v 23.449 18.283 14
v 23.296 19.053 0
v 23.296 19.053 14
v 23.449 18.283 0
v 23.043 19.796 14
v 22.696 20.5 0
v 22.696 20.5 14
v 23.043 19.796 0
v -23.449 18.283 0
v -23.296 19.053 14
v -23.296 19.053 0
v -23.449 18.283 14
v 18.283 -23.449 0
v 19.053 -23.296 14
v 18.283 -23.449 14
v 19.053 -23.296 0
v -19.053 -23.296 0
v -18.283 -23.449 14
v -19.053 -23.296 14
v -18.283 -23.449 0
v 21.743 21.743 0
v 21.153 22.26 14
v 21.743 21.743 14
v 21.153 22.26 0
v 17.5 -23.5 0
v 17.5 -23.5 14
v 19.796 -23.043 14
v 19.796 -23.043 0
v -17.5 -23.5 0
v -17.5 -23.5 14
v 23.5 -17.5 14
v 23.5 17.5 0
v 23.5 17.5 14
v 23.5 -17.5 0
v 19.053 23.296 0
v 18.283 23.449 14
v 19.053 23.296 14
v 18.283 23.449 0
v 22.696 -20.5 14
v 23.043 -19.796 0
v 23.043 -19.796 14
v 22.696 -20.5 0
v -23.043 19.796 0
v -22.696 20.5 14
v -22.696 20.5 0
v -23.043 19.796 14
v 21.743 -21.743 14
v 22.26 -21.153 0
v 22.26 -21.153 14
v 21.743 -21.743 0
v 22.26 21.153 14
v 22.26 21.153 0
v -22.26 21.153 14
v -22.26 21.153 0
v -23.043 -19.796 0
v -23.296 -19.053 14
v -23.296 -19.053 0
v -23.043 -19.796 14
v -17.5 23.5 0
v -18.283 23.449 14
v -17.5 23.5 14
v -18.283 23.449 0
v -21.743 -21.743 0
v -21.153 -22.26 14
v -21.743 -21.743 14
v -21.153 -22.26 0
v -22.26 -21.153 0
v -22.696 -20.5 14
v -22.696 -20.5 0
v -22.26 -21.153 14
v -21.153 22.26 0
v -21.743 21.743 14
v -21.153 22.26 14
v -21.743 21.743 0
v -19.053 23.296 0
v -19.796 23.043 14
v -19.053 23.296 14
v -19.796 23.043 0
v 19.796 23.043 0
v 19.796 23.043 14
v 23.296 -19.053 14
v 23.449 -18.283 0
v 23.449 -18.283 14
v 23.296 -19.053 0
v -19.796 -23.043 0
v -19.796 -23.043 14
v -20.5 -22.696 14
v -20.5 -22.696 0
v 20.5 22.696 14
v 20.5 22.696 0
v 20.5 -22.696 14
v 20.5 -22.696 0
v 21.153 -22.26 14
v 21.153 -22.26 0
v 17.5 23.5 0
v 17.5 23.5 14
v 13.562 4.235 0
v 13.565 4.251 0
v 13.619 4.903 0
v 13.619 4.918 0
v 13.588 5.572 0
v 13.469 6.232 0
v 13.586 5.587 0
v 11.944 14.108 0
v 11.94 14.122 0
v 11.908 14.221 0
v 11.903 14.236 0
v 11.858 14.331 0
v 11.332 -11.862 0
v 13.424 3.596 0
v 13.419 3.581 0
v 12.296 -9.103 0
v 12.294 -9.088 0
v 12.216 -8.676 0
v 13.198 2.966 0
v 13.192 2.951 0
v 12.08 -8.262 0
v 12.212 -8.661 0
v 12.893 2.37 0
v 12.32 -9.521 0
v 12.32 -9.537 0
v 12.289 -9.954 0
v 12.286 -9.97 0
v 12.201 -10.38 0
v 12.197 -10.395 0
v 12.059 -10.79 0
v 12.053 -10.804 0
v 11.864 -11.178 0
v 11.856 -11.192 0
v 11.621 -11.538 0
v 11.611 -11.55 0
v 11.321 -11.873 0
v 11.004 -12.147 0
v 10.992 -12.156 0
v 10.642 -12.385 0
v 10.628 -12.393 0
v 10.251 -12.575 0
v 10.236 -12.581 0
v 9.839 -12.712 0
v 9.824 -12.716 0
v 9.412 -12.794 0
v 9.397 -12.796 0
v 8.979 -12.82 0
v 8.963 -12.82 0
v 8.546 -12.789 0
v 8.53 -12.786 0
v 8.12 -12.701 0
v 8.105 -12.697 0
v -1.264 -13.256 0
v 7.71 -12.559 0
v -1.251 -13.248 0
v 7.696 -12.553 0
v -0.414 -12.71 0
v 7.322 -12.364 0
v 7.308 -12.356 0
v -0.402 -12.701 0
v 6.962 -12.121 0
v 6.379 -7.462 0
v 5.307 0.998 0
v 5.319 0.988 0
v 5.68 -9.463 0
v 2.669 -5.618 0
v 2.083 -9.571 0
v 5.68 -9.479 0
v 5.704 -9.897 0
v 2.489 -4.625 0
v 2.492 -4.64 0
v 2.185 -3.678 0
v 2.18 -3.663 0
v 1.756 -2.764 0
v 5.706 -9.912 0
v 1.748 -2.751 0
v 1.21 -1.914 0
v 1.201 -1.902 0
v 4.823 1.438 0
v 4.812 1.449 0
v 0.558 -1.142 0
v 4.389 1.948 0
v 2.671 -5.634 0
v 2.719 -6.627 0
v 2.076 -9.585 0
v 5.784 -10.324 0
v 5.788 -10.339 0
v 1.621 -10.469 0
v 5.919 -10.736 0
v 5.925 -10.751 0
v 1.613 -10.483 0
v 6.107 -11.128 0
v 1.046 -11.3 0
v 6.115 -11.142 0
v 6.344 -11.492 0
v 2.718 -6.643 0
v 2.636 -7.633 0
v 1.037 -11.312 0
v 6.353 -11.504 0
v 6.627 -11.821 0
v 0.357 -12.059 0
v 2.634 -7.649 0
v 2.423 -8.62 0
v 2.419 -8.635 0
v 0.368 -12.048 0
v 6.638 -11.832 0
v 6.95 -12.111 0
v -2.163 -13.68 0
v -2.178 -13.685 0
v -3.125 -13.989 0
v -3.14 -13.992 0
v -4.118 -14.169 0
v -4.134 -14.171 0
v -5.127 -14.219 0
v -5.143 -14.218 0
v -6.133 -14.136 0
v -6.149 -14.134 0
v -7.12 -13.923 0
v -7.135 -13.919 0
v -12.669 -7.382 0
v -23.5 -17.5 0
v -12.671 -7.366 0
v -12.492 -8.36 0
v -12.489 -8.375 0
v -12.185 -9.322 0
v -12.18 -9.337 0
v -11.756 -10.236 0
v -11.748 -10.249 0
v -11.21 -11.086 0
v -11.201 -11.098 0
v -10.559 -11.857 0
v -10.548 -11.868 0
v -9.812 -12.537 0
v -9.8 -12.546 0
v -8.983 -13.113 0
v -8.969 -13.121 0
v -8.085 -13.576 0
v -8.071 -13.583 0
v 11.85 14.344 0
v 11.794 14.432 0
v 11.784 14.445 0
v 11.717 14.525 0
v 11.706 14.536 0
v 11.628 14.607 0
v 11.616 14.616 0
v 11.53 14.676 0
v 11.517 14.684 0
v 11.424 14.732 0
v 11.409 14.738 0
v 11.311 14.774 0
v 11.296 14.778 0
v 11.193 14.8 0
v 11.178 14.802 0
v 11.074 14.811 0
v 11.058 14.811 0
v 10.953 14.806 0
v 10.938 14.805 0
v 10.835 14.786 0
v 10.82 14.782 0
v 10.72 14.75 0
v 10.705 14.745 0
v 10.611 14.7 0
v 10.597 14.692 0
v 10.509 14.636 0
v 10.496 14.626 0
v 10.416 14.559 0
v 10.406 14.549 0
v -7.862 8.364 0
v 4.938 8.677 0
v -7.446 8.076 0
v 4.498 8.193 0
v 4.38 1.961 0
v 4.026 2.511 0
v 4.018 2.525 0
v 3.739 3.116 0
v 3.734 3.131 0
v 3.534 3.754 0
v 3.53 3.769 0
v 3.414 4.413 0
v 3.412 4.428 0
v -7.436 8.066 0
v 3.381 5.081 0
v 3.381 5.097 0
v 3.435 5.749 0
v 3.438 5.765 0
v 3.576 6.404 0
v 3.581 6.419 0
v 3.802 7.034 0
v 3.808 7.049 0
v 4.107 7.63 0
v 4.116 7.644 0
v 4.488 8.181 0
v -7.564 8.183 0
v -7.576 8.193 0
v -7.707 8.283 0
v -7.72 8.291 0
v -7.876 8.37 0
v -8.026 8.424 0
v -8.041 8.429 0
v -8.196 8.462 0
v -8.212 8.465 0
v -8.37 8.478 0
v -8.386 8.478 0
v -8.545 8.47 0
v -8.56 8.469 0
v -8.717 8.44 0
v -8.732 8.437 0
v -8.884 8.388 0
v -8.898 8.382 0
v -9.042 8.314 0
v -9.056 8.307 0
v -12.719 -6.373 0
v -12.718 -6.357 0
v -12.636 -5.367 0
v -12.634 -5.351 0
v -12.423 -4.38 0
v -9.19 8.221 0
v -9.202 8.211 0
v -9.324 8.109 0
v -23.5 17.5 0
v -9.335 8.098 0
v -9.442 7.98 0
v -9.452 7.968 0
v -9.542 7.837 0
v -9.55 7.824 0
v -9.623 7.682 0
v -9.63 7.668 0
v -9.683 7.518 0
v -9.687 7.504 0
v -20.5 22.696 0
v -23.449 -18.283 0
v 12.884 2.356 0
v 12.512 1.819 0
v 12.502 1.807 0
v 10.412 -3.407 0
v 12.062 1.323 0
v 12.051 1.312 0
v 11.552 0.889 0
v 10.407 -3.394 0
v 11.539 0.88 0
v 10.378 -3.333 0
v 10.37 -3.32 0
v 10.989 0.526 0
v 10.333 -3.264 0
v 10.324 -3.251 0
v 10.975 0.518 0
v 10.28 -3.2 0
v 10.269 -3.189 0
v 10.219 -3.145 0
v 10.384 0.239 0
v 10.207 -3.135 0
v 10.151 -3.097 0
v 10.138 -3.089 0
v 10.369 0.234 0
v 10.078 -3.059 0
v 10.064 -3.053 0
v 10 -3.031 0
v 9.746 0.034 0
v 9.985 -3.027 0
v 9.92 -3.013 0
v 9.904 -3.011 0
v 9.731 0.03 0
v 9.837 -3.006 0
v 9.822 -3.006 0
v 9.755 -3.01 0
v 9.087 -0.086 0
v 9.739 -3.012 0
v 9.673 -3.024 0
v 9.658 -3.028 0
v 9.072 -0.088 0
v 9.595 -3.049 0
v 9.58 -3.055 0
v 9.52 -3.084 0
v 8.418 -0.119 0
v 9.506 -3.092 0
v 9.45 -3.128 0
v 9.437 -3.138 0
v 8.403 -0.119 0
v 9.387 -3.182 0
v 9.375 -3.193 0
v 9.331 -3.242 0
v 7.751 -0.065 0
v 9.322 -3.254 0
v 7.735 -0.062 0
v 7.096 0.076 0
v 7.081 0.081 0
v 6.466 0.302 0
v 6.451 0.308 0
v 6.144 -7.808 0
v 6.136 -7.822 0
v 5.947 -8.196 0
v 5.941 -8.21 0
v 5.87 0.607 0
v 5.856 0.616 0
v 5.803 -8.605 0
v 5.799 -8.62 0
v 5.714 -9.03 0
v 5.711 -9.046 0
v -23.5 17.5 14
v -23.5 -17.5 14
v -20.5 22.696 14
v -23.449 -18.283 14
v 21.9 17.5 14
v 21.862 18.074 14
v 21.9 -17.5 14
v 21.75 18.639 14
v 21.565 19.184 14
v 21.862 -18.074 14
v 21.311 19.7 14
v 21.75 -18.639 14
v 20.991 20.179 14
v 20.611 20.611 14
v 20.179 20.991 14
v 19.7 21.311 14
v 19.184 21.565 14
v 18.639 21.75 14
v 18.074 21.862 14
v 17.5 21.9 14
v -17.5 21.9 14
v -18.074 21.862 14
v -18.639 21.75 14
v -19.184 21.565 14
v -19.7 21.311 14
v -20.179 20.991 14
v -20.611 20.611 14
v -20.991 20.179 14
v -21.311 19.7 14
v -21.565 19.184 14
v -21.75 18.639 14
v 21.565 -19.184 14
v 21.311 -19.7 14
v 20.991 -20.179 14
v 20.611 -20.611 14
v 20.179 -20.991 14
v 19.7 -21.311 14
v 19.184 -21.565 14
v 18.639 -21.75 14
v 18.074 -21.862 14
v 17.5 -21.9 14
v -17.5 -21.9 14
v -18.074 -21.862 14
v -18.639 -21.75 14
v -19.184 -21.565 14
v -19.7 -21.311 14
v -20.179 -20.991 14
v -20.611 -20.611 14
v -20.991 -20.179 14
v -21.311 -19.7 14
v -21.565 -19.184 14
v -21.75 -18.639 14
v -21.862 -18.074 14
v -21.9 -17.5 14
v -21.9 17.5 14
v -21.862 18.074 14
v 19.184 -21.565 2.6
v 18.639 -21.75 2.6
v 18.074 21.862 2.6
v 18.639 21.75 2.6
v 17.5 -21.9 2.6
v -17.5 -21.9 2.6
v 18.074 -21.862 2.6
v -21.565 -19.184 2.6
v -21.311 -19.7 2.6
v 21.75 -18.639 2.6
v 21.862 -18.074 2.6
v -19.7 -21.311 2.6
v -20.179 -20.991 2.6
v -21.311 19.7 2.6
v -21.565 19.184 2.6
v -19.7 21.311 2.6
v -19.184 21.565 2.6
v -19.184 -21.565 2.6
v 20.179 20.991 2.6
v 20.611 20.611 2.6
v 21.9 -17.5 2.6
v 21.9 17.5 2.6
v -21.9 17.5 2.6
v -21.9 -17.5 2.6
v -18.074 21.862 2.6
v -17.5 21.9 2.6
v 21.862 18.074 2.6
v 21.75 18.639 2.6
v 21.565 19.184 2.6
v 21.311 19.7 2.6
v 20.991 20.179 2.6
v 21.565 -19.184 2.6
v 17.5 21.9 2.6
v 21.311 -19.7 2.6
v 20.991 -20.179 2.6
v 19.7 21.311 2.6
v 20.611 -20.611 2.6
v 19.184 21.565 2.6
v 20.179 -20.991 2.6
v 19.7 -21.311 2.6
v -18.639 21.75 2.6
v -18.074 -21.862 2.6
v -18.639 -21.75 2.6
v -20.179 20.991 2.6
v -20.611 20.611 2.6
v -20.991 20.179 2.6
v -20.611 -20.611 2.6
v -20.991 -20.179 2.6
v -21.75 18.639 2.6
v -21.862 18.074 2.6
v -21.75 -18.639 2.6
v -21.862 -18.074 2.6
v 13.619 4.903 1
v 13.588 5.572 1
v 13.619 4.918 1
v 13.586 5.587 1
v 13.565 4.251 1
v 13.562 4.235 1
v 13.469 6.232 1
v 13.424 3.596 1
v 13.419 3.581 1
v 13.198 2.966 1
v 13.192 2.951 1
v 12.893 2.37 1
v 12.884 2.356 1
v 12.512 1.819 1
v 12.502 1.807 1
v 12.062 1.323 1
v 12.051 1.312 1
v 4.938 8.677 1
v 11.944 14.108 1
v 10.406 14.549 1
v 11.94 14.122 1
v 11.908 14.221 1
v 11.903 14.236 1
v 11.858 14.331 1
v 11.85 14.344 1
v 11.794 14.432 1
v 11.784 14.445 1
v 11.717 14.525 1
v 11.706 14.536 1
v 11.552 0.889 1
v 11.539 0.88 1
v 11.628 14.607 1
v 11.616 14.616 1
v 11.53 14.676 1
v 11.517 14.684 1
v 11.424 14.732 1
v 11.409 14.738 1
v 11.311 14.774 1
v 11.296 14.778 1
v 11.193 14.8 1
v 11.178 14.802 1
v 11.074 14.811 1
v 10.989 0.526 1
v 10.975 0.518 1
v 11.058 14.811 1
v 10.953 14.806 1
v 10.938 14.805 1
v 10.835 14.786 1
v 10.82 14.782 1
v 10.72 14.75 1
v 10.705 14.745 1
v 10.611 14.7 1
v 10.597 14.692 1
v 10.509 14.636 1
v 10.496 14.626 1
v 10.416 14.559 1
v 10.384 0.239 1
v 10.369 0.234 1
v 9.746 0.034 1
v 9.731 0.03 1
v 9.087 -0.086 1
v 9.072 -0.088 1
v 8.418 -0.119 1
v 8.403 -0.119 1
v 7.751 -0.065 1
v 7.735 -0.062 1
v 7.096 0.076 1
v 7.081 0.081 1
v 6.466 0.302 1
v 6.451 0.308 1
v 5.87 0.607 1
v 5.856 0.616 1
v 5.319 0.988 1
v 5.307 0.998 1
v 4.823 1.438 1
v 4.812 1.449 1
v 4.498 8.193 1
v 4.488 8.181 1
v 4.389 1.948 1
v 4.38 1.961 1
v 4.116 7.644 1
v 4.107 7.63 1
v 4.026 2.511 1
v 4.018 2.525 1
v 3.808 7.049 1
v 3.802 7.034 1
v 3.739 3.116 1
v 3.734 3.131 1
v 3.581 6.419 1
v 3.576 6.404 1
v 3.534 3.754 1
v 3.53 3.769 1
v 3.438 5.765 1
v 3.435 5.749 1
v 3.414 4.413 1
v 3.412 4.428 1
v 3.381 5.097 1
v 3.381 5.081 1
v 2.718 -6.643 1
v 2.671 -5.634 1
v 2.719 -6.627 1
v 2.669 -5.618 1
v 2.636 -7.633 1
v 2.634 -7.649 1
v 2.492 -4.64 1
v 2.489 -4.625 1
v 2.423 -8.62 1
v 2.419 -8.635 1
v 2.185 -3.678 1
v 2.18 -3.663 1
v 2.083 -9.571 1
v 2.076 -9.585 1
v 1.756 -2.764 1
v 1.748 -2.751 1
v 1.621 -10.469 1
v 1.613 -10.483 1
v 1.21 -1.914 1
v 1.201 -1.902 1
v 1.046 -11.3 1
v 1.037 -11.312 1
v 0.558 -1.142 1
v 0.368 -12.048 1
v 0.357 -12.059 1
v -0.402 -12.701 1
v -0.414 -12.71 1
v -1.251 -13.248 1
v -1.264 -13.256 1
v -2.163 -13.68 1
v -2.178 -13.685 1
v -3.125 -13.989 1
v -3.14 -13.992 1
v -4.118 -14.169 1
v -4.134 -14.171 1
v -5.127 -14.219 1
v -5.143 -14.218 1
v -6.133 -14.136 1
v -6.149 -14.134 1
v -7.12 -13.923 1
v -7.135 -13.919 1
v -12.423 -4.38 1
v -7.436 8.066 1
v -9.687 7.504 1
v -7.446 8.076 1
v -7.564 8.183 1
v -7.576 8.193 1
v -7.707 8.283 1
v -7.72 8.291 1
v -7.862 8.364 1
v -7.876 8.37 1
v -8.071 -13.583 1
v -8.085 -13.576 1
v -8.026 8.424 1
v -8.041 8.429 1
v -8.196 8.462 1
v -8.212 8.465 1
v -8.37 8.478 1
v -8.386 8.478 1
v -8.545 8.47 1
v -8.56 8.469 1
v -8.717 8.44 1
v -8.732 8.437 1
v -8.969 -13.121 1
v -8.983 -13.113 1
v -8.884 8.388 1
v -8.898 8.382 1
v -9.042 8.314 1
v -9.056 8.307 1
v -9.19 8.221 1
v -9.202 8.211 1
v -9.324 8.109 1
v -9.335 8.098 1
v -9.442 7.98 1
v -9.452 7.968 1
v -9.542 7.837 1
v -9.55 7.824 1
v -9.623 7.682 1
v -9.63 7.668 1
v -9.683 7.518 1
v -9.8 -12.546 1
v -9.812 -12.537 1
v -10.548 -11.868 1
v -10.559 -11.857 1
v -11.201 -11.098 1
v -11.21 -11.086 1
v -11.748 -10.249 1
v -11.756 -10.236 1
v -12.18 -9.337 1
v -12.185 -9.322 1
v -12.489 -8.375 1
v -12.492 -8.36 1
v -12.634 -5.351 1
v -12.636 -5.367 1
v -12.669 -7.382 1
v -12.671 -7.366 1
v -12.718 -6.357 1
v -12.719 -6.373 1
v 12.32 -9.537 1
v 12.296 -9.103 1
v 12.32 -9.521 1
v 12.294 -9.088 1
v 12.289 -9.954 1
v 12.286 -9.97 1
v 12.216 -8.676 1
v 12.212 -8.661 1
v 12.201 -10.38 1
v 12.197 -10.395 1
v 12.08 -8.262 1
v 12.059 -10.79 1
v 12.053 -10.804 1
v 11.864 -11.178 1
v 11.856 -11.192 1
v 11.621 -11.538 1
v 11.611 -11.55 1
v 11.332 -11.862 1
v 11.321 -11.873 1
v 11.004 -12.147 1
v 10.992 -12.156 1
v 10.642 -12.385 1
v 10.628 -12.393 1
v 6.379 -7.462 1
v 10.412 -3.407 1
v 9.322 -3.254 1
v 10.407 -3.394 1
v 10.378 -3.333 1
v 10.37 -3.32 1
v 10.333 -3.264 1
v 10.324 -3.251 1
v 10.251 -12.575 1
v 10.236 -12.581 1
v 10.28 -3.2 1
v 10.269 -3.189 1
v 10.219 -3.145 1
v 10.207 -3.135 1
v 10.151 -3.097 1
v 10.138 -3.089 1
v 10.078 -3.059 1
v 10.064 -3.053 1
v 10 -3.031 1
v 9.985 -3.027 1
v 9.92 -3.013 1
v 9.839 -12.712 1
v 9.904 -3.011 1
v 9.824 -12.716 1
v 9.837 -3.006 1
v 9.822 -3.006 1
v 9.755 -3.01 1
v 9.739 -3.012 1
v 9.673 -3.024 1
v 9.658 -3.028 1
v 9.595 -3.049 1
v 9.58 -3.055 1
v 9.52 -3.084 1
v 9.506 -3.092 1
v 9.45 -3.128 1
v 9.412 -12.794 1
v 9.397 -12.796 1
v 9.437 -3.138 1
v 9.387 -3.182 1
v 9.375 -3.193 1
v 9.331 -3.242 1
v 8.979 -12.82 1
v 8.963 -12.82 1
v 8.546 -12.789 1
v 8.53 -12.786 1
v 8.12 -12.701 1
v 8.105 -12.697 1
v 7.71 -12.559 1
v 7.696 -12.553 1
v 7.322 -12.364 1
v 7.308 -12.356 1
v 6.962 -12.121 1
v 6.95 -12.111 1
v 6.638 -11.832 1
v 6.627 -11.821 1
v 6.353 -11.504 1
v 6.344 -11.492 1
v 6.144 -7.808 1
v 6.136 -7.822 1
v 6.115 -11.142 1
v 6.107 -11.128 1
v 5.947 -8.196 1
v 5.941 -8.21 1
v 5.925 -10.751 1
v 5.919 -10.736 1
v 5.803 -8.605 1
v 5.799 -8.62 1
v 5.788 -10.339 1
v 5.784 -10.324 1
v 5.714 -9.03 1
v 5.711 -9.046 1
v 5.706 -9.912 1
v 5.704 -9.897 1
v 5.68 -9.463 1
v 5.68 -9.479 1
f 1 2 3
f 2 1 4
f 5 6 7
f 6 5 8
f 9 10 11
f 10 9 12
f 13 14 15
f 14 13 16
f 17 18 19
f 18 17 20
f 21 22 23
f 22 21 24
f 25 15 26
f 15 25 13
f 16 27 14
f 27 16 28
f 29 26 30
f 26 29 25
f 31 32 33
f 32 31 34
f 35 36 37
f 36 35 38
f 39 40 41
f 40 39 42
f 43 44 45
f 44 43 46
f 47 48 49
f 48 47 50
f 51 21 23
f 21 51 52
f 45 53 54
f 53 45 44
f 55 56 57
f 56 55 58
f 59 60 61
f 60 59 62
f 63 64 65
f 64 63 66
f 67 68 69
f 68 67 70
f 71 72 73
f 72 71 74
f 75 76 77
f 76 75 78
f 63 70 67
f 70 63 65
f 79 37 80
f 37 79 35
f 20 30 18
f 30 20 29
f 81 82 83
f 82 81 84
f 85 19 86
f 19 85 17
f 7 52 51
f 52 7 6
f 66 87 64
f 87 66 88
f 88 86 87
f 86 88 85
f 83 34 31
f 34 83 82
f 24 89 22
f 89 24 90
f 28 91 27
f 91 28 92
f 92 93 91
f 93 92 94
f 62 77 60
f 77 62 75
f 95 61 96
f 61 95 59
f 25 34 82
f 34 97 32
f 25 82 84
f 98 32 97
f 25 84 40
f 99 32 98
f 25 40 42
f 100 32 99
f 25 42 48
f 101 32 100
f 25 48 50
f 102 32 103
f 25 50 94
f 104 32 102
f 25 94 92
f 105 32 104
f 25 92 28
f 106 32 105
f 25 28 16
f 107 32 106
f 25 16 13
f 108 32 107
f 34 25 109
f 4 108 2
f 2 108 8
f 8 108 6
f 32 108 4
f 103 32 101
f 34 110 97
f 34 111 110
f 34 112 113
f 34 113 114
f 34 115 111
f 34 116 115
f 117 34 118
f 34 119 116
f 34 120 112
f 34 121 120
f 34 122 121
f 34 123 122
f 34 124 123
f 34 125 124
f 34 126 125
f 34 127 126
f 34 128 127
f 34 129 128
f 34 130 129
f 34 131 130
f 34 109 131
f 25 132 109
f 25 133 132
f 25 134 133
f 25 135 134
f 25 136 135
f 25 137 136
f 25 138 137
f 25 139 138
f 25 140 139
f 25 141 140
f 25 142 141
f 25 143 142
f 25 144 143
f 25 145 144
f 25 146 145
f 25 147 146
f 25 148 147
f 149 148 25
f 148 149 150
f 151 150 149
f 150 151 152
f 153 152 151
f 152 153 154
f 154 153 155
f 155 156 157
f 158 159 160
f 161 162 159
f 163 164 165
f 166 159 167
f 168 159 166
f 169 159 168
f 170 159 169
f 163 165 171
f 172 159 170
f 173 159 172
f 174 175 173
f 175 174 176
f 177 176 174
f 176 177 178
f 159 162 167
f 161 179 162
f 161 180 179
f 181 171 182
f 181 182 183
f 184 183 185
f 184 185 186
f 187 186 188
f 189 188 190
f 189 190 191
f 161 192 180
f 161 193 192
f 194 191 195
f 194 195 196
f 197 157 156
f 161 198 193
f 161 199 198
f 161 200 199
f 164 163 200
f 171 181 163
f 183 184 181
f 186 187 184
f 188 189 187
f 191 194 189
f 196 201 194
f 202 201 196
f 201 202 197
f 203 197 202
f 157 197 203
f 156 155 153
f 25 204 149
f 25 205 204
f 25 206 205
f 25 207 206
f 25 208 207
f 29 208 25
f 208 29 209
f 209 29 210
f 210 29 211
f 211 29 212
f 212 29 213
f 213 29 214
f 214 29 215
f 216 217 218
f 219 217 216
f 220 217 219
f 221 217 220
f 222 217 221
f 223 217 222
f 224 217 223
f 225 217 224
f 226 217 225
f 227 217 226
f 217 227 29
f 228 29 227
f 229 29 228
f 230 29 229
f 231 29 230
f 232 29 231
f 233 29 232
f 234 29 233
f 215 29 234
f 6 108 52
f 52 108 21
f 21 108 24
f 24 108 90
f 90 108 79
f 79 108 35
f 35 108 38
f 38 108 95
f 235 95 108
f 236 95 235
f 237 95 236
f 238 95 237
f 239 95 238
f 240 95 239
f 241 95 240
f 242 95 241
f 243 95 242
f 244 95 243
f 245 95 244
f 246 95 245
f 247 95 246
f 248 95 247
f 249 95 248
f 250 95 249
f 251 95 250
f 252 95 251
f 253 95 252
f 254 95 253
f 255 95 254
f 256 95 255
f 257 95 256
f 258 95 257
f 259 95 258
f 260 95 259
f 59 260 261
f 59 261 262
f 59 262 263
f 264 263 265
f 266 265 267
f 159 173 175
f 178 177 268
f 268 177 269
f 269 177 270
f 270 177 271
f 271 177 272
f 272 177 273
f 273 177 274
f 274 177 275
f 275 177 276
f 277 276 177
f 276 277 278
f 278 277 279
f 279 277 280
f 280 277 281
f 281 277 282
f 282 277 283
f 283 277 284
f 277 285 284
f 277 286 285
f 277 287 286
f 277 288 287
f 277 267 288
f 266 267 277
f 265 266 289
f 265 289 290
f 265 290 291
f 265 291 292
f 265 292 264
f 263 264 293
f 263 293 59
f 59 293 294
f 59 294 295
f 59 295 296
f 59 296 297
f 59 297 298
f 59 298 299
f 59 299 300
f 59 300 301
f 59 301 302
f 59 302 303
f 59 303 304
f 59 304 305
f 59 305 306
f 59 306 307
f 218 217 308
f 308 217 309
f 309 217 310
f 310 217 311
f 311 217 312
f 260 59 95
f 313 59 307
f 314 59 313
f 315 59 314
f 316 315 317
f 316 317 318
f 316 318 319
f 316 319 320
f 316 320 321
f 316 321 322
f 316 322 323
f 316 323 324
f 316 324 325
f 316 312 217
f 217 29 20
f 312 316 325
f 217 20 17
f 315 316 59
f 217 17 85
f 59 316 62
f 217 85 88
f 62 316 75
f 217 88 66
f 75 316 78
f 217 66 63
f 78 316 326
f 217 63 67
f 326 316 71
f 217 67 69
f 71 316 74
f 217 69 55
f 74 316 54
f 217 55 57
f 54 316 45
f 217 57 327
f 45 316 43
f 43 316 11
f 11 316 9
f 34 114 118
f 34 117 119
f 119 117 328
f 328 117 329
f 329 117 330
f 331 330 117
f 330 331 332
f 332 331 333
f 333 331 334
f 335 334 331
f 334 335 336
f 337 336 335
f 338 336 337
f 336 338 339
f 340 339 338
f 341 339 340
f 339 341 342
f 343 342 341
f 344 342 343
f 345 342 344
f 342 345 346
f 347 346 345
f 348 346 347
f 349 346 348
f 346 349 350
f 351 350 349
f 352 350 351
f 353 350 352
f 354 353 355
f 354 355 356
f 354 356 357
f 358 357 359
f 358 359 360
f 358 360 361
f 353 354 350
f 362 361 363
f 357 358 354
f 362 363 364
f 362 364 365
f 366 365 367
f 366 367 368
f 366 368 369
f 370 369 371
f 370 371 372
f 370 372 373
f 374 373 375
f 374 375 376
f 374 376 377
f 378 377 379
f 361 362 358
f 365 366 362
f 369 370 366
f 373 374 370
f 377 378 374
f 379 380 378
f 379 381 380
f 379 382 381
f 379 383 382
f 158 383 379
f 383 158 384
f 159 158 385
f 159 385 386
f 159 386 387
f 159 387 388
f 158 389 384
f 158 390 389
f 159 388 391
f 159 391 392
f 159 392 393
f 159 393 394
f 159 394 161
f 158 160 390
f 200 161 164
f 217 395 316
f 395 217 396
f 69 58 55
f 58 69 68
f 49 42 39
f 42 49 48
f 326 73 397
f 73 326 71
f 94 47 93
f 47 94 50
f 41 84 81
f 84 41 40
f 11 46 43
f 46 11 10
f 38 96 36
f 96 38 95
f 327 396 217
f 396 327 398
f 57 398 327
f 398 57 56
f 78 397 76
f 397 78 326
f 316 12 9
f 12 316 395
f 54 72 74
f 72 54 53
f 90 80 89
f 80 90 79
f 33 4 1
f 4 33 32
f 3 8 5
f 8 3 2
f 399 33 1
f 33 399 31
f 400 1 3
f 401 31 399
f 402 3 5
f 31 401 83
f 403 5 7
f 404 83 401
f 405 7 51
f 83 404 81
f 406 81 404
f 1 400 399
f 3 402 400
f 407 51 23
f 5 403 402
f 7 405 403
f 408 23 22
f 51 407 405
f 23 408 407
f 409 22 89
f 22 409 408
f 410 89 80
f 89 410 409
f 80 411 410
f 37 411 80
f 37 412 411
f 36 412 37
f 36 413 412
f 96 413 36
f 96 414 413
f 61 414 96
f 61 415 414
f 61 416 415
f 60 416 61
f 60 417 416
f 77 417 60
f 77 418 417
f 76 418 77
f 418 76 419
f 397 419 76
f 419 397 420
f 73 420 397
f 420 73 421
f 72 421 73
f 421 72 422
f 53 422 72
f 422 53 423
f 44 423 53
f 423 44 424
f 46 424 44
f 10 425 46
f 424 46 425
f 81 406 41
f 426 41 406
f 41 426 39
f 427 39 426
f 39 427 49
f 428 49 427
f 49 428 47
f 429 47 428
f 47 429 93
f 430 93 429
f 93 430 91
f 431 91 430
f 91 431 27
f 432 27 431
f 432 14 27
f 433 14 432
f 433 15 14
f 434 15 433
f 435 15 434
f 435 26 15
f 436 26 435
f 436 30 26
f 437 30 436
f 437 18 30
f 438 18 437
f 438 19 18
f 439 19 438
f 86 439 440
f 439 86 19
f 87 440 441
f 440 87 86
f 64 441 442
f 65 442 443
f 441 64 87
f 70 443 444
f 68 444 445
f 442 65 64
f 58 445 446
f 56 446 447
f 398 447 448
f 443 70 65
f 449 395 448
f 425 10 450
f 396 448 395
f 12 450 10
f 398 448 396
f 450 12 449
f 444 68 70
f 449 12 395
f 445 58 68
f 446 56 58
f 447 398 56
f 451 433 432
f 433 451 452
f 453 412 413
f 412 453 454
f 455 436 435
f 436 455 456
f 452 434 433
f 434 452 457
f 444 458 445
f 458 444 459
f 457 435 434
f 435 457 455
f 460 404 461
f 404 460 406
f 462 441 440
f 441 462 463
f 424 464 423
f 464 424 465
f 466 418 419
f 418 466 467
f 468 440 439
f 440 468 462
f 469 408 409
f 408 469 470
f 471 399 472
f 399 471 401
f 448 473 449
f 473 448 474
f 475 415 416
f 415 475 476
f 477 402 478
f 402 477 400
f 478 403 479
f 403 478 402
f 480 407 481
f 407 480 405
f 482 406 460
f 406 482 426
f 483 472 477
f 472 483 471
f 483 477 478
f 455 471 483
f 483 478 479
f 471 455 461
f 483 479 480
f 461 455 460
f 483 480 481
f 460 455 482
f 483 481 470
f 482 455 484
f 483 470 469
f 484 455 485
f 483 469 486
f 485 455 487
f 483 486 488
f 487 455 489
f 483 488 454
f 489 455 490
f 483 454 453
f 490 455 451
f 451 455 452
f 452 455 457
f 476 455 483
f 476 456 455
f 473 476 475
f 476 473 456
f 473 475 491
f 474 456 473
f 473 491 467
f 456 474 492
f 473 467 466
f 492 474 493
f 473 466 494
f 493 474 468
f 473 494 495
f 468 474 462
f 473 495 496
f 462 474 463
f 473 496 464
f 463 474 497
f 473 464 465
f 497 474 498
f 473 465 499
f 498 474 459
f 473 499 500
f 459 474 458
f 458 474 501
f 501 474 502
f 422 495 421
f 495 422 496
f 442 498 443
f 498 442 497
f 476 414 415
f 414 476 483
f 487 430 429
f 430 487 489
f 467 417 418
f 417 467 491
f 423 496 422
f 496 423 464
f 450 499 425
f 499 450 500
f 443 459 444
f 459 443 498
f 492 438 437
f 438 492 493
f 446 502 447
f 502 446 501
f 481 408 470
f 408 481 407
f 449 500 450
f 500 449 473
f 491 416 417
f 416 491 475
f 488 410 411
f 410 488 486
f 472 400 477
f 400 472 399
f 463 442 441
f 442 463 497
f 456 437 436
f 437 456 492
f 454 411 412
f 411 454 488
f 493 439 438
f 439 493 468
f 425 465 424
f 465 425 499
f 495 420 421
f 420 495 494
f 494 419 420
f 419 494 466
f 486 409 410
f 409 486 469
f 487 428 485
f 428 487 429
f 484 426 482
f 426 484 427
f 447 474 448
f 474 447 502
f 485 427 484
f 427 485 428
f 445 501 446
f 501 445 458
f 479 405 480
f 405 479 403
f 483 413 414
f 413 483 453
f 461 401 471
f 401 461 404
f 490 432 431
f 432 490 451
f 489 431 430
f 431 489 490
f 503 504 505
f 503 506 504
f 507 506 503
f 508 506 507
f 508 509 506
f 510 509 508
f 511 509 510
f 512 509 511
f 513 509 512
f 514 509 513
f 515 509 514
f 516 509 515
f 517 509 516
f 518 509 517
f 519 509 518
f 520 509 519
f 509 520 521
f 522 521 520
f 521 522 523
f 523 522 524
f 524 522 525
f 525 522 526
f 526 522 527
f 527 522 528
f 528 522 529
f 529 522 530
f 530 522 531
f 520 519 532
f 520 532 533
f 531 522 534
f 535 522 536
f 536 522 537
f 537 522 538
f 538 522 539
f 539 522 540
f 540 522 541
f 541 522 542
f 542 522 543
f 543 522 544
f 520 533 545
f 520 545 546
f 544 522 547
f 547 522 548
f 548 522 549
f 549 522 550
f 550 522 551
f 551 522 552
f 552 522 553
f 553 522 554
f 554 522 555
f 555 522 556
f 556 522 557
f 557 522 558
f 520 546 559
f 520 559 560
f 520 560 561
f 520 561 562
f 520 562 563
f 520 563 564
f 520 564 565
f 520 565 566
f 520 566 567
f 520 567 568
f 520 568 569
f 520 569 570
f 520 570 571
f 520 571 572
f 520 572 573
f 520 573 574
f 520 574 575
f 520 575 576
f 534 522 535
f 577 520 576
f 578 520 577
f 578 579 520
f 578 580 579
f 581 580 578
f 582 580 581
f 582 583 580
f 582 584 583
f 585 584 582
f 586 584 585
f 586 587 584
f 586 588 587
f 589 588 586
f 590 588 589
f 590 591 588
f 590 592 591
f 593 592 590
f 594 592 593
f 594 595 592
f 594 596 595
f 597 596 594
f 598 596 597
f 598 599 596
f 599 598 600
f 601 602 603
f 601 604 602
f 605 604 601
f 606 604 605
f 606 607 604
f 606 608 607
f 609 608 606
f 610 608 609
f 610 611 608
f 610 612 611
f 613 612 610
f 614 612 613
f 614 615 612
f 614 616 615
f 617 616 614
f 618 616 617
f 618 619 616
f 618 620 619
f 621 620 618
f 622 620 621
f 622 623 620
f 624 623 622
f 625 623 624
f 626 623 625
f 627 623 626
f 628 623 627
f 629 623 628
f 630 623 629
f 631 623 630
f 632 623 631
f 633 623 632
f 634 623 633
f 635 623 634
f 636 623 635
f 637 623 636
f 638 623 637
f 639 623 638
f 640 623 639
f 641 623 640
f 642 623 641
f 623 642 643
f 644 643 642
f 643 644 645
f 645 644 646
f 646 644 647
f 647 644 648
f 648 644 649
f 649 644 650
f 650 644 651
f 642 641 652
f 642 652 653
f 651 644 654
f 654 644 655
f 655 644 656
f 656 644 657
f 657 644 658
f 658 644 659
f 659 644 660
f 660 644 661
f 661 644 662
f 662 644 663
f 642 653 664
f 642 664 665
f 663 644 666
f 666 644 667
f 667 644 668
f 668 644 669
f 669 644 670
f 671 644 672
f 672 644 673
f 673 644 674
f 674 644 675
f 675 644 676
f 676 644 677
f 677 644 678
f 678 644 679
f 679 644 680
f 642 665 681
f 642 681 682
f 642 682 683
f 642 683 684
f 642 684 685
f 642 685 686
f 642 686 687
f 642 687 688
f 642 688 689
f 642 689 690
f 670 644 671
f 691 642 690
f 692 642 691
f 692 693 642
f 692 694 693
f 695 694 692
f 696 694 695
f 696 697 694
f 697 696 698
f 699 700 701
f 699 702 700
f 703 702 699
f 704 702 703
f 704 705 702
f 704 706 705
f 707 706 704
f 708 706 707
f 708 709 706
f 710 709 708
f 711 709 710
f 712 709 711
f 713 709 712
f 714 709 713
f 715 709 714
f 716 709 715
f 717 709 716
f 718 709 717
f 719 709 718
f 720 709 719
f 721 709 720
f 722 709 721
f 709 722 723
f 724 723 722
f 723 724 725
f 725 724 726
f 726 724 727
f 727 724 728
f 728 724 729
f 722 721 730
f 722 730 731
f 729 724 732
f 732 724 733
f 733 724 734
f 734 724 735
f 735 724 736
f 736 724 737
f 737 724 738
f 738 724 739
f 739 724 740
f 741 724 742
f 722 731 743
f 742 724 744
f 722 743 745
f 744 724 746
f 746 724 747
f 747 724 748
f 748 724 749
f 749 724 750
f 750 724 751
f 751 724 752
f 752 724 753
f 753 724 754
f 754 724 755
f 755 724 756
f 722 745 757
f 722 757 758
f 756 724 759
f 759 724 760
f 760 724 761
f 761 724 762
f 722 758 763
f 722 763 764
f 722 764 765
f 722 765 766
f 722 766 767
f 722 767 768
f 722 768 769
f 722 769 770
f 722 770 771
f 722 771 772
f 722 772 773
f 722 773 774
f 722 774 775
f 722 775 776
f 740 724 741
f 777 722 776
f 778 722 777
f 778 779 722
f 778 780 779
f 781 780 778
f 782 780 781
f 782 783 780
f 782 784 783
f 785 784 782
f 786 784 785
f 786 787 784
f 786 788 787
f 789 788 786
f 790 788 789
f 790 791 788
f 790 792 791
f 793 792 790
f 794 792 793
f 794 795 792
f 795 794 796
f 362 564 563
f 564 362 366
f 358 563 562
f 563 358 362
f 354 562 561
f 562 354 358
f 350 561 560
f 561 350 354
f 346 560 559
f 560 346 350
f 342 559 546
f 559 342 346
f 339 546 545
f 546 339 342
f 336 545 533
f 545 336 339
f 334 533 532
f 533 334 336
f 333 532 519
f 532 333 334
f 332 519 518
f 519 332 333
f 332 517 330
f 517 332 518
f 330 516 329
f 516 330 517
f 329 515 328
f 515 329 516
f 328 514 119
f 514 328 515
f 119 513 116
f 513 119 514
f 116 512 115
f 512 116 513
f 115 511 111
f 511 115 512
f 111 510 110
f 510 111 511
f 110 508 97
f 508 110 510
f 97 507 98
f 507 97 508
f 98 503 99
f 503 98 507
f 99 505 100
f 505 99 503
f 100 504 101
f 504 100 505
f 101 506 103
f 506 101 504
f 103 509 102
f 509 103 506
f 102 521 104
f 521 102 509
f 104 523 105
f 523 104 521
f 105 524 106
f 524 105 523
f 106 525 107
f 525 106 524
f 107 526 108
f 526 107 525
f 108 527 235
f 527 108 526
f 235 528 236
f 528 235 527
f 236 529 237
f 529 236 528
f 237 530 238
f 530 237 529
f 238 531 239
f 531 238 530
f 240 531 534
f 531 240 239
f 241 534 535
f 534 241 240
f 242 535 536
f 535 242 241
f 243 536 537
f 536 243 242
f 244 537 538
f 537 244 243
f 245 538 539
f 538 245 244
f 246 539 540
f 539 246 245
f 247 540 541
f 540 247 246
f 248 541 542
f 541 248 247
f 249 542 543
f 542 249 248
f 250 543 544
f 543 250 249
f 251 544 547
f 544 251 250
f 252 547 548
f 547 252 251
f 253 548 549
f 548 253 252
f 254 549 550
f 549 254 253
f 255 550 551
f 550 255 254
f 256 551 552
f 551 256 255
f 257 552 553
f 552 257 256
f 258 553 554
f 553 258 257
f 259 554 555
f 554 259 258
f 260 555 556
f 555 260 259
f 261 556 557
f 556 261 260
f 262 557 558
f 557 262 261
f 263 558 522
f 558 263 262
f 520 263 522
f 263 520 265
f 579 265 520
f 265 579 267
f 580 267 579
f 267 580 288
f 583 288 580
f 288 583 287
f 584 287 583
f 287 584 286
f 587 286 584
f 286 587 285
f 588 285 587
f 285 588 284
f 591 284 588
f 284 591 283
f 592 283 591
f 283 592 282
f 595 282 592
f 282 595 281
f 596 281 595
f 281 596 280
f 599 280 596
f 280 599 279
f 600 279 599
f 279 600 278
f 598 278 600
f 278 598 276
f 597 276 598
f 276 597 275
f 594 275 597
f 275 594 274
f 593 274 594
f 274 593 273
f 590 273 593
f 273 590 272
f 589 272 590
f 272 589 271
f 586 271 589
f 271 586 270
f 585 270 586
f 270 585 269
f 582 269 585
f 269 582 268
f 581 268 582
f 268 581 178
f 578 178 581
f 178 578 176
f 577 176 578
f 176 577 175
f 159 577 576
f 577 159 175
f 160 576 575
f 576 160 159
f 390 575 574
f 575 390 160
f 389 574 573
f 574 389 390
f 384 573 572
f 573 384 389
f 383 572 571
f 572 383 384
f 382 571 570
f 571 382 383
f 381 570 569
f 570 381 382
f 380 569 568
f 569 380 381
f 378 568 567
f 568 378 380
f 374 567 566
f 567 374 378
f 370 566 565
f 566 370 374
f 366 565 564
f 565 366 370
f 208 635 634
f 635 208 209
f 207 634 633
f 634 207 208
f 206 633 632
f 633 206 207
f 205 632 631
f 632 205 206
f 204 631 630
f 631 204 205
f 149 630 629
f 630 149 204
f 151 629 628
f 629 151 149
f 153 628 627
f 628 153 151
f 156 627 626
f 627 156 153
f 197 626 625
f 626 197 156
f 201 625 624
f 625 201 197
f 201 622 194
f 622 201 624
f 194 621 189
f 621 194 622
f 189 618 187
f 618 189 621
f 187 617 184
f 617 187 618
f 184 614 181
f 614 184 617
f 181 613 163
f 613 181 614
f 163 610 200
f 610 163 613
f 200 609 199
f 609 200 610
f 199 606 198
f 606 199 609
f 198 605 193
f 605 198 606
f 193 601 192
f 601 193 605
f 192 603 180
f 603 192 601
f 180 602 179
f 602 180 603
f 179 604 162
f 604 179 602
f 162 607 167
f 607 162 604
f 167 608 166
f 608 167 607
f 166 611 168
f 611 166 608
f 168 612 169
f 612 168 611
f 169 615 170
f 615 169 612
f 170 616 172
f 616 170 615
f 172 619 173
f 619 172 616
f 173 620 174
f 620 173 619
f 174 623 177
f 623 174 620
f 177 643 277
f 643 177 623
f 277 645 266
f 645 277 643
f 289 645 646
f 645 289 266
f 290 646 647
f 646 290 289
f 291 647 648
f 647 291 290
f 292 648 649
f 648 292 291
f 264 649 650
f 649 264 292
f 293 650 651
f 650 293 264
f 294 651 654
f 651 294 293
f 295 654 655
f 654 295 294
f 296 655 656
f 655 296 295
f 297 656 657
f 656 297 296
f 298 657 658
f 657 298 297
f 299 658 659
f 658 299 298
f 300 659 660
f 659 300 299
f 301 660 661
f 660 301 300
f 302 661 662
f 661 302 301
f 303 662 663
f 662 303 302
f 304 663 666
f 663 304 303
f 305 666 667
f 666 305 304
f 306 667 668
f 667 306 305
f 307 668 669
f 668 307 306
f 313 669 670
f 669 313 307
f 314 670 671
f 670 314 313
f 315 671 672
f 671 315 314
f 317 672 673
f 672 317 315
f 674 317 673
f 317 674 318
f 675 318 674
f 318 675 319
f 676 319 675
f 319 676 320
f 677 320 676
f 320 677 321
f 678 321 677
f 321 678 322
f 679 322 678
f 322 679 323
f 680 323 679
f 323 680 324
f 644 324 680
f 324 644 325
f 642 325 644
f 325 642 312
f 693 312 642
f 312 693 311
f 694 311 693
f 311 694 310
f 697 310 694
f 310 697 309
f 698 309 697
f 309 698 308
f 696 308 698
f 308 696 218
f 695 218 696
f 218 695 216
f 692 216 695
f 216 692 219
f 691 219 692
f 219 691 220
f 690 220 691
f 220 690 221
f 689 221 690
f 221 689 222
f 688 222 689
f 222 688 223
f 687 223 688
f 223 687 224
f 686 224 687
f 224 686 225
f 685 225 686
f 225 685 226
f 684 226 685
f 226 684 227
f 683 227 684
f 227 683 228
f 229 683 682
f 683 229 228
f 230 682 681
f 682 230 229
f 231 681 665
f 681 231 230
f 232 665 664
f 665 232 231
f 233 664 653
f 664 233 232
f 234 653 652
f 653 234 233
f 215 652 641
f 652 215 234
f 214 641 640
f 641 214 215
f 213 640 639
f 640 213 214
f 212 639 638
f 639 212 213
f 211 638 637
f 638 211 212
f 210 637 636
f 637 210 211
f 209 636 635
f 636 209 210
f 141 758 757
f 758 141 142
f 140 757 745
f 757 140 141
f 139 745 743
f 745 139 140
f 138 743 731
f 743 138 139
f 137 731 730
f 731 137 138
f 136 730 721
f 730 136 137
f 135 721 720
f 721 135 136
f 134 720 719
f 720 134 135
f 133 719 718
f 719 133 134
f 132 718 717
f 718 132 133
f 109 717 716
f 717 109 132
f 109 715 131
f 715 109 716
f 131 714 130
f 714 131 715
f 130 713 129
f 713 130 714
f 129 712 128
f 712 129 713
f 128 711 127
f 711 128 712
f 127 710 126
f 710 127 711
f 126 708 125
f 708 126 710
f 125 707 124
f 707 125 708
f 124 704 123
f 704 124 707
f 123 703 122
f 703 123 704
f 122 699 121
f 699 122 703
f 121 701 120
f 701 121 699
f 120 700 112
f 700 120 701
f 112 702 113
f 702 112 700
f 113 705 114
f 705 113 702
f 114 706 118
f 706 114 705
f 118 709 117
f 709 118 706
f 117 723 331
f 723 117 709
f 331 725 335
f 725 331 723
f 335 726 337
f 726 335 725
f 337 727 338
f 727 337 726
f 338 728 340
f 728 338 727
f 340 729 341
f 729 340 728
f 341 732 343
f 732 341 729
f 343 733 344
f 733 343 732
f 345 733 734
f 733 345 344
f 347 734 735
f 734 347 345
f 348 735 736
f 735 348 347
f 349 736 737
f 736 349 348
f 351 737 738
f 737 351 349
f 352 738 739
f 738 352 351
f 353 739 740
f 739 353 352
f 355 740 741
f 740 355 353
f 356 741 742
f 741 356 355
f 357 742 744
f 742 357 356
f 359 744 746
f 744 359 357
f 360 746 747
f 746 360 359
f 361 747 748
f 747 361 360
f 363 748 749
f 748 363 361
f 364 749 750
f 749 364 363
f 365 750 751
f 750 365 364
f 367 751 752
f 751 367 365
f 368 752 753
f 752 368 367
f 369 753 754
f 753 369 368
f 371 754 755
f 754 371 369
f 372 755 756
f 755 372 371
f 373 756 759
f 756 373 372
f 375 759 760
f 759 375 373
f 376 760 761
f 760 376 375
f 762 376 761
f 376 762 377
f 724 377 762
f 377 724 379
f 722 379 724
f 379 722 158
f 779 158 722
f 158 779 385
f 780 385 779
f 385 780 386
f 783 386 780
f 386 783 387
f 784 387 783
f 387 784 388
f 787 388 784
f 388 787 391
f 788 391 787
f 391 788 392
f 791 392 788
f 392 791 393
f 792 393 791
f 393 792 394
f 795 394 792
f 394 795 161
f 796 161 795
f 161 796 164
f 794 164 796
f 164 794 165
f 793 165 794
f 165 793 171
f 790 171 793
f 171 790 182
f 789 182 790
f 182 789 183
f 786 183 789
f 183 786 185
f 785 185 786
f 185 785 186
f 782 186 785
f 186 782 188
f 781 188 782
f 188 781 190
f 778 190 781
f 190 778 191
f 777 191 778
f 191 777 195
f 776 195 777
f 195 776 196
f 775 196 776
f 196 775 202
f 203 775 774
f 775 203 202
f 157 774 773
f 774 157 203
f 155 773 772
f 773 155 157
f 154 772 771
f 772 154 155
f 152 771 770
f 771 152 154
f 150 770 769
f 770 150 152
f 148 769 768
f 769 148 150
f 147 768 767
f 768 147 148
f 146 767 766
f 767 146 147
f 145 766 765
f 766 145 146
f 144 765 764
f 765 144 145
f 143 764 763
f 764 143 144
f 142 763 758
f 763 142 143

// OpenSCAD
// file: emoji.scad
// Hand-modelled 💦 and 💩 as 2D outlines (no emoji font needed).
// emoji2d(kind) is the filled silhouette used for the recess and the inlay
// body; emoji_holes2d(kind) are the through-holes in the inlay (eyes, smile,
// droplet highlight) that let the cap colour show through.
// Both are in "viewer" orientation: +y up on the wall, seen from the front.
include <config.scad>

/* ── 💩 ─────────────────────────────────────────────────────── */
module poop_lobe(dx, y, r, spread) {
  hull() {
    translate([dx - spread, y]) circle(r);
    translate([dx + spread, y]) circle(r);
  }
}
module poop2d() {
  scale(emoji_scale) union() {
    poop_lobe( 0,  -9.5, 7.0, 9.0);   // base pile, 32 wide
    poop_lobe(-0.8, -1.0, 5.6, 6.0);  // middle
    poop_lobe( 0.8,  5.8, 4.2, 3.2);  // top
    // curl tip leaning up-right
    hull() {
      translate([1.5, 9.5]) circle(3.2);
      translate([4.8, 14.0]) circle(1.3);
    }
  }
}
module poop_holes2d() {
  scale(emoji_scale) {
    for (s = [-1, 1]) translate([s * 5.4, -4.2]) circle(2.9);   // eyes
    // smile: crescent under the eyes
    intersection() {
      difference() {
        translate([0, -9.2]) circle(6.4);
        translate([0, -6.6]) circle(6.4);
      }
      translate([-8, -16.5]) square([16, 6.2]);
    }
  }
}

/* ── 💦 ─────────────────────────────────────────────────────── */
module droplet2d(r) {          // teardrop, tip up, base circle r
  hull() {
    circle(r);
    translate([0, 1.85 * r]) circle(0.16 * r);
  }
}
drops = [                       // [x, y, r, tilt°]
  [ 5.0, -6.5, 7.6, -14],       // big, leaning right
  [-8.5,  5.0, 5.0,  16],       // medium, leaning left
  [-9.0, -9.5, 3.2,   8],       // small
];
module sweat_drop(i) {
  d = drops[i];
  translate([d[0], d[1]]) rotate(d[3]) droplet2d(d[2]);
}
module sweat2d() {
  scale(emoji_scale) for (i = [0 : len(drops) - 1]) sweat_drop(i);
}
module sweat_holes2d() {        // one shine on the big drop
  scale(emoji_scale) translate([5.0, -6.5]) rotate(-14)
    translate([-2.6, -1.4]) rotate(-14) scale([0.7, 1]) circle(1.6);
}

/* ── dispatch ────────────────────────────────────────────────── */
module emoji2d(kind) {
  if (kind == "poop") poop2d(); else sweat2d();
}
module emoji_holes2d(kind) {
  if (kind == "poop") poop_holes2d(); else sweat_holes2d();
}
// separate pieces (💦 is three drops) — used to export inlays one per file
function emoji_pieces(kind) = kind == "poop" ? 1 : len(drops);
module emoji_piece2d(kind, i) {
  if (kind == "poop") poop2d();
  else scale(emoji_scale) sweat_drop(i);
}

// preview when opened directly
translate([-22, 0]) emoji2d("sweat");
translate([ 22, 0]) difference() { poop2d(); poop_holes2d(); }
// file: config.scad
// Biru Buttons · switch plate (design 03) — shared parameters
// Two big square caps (💦 pee / 💩 poop) on a wall plate beside the door.
// All mm. Every part includes this file.
//
// Coordinates: face.scad has the FRONT face at z=0 and grows toward the wall
// (+z). back.scad / cap.scad / inlay.scad have their bed-side face at z=0.
// Everything prints exactly as modelled — flat side down, no supports.

/* ── plate ───────────────────────────────────────────────────── */
plate_w = 70;
plate_h = 125;
plate_d = 22;          // wall to front face
wall    = 2.4;
corner_r = 8;
back_t  = 2.4;         // back plate (nests inside the shell)

/* ── caps ────────────────────────────────────────────────────── */
cap_size  = 47;        // square cap
cap_r     = 6;         // cap corner radius
cap_pitch = 56;        // cap centre to cap centre (stacked vertically)
cap_proud = 6;         // how far the cap face stands off the plate at rest
cap_top   = 2.6;       // cap face thickness
cap_chamfer = 1.5;     // edge chamfer on the cap face
cap_travel = 4;        // MX travel
skirt_t   = 1.6;       // cap skirt wall
skirt_h   = 14;        // skirt height incl. the face (anti-wobble guide)
well_clear = 1.0;      // gap between cap and well per side
well_r    = cap_r + well_clear;
guide_t   = 1.6;       // guide tube wall behind the front skin
guide_depth = 12;      // guide tube depth from the front face
cap_centres = [cap_pitch/2, -cap_pitch/2];   // pee (top), poop (bottom)

/* ── emoji inlays ────────────────────────────────────────────── */
emoji_scale = 1.0;     // 1.0 ≈ 32 mm tall emoji on a 47 mm cap
recess_d    = 1.0;     // recess in the cap face
inlay_t     = 2.0;     // inlay thickness → stands (inlay_t - recess_d) proud
inlay_clear = 0.12;    // recess is offset by this per side

/* ── switches (Cherry-MX style, plate mount on a tower) ─────── */
mx_cut   = 14.0;
mx_plate = 1.5;
mx_body  = 15.6;       // clearance for the switch body below the plate
stem_top = 6.6;        // MX stem tip above the plate top at rest
tower_w  = 20;         // square tower, walls = (tower_w - mx_cut)/2
stem_od  = 5.5;        // cap stem boss
boss_h   = 5.0;        // boss below the cap face
stem_len = 3.8;        // cross pocket depth
cross_w  = 4.15;
cross_t  = 1.35;       // 1.27 nominal + FDM slack — test-fit and adjust
wire_slot_w = 5;       // wire exits in the tower sides
wire_slot_h = 10;

// tower height so the cap face rests cap_proud off the plate
tower_h = (plate_d - back_t) - stem_top
          - (-cap_proud + cap_top + boss_h - stem_len);

/* ── LED light pipe (front skin, bottom right) ───────────────── */
led_slot_w = 16;
led_slot_h = 3;
led_pos = [20, -(plate_h/2 - 5.5)];

/* ── electronics (ESP32-C3 SuperMini on the back plate) ──────── */
esp_w = 18.5;          // across (x)
esp_l = 23.5;          // along the plate (y), USB-C at the bottom end
esp_t = 5;
esp_x = -19.75;        // board centre x — beside the lower tower
esp_gap = 0.6;         // board bottom edge from the inner wall
usb_w = 9.4;
usb_h = 3.6;
usb_z = 17;            // plug centre from the front face (face coords)
rail_t = 1.2;
rail_h = 2.5;

/* ── mounting ────────────────────────────────────────────────── */
m3_insert_d = 4.0;
m3_clear_d  = 3.4;
boss_d = m3_insert_d + 2*wall;
boss_pos = [[29.5, 0], [-29.5, 0], [0, 58], [0, -58]];
keyhole_screw_d = 4.2;
keyhole_slot_d  = 2.4;
keyhole_slot_l  = 5;
keyhole_pos = [[0, 44], [0, -46]];   // big hole; slot runs upward (hidden under the caps)

$fn = 48;

module rrect(w, h, r) {
  offset(r = r) square([w - 2*r, h - 2*r], center = true);
}
// main file
// One big square cap. Face-down on the bed (z=0 is the cap face).
//   kind = "sweat" | "poop"      which emoji
//   part = "cap"                 cap with a 1 mm recess for the inlay
//          "inlay"               the emoji piece(s) that glue into the recess
//          "onepiece"            cap + raised emoji, for multi-material printers
//   piece = n                    which inlay piece (💦 has 3 drops)
include <config.scad>
use <emoji.scad>
kind = "sweat";
part = "cap";
piece = 0;

// the bed side is what you see on the wall, so mirror the artwork
module art2d(kind)   { mirror([1, 0, 0]) emoji2d(kind); }
module holes2d(kind) { mirror([1, 0, 0]) emoji_holes2d(kind); }

module cap_body() {
  difference() {
    union() {
      // chamfered face
      hull() {
        linear_extrude(0.01) rrect(cap_size - 2*cap_chamfer, cap_size - 2*cap_chamfer, cap_r - cap_chamfer);
        translate([0, 0, cap_chamfer]) linear_extrude(cap_top - cap_chamfer) rrect(cap_size, cap_size, cap_r);
      }
      // skirt
      linear_extrude(skirt_h) rrect(cap_size, cap_size, cap_r);
      // stem boss
      translate([0, 0, cap_top - 0.01]) cylinder(d = stem_od, h = boss_h + 0.01);
    }
    // hollow inside the skirt
    translate([0, 0, cap_top]) linear_extrude(skirt_h)
      rrect(cap_size - 2*skirt_t, cap_size - 2*skirt_t, cap_r - skirt_t);
    // MX cross pocket
    translate([0, 0, cap_top + boss_h - stem_len]) linear_extrude(stem_len + 1) {
      square([cross_w, cross_t], center = true);
      square([cross_t, cross_w], center = true);
    }
  }
}

module cap_recessed(kind) {
  difference() {
    cap_body();
    translate([0, 0, -1]) linear_extrude(recess_d + 1) offset(r = inlay_clear) art2d(kind);
  }
}

module inlay(kind, i) {
  difference() {
    linear_extrude(inlay_t) mirror([1, 0, 0]) emoji_piece2d(kind, i);
    translate([0, 0, -1]) linear_extrude(inlay_t + 2) holes2d(kind);
  }
}

module onepiece(kind) {
  union() {
    difference() {
      cap_body();
      translate([0, 0, -1]) linear_extrude(1.01) holes2d(kind);  // eyes read as 1 mm engraving
    }
    translate([0, 0, -(inlay_t - recess_d)])
      linear_extrude(inlay_t - recess_d + 0.01)
        difference() { art2d(kind); holes2d(kind); }
  }
}

module cap_part(kind, part, piece = 0) {
  if (part == "cap") cap_recessed(kind);
  else if (part == "inlay") inlay(kind, piece);
  else onepiece(kind);
}
function pieces(kind) = emoji_pieces(kind);
cap_part(kind, part, piece);
